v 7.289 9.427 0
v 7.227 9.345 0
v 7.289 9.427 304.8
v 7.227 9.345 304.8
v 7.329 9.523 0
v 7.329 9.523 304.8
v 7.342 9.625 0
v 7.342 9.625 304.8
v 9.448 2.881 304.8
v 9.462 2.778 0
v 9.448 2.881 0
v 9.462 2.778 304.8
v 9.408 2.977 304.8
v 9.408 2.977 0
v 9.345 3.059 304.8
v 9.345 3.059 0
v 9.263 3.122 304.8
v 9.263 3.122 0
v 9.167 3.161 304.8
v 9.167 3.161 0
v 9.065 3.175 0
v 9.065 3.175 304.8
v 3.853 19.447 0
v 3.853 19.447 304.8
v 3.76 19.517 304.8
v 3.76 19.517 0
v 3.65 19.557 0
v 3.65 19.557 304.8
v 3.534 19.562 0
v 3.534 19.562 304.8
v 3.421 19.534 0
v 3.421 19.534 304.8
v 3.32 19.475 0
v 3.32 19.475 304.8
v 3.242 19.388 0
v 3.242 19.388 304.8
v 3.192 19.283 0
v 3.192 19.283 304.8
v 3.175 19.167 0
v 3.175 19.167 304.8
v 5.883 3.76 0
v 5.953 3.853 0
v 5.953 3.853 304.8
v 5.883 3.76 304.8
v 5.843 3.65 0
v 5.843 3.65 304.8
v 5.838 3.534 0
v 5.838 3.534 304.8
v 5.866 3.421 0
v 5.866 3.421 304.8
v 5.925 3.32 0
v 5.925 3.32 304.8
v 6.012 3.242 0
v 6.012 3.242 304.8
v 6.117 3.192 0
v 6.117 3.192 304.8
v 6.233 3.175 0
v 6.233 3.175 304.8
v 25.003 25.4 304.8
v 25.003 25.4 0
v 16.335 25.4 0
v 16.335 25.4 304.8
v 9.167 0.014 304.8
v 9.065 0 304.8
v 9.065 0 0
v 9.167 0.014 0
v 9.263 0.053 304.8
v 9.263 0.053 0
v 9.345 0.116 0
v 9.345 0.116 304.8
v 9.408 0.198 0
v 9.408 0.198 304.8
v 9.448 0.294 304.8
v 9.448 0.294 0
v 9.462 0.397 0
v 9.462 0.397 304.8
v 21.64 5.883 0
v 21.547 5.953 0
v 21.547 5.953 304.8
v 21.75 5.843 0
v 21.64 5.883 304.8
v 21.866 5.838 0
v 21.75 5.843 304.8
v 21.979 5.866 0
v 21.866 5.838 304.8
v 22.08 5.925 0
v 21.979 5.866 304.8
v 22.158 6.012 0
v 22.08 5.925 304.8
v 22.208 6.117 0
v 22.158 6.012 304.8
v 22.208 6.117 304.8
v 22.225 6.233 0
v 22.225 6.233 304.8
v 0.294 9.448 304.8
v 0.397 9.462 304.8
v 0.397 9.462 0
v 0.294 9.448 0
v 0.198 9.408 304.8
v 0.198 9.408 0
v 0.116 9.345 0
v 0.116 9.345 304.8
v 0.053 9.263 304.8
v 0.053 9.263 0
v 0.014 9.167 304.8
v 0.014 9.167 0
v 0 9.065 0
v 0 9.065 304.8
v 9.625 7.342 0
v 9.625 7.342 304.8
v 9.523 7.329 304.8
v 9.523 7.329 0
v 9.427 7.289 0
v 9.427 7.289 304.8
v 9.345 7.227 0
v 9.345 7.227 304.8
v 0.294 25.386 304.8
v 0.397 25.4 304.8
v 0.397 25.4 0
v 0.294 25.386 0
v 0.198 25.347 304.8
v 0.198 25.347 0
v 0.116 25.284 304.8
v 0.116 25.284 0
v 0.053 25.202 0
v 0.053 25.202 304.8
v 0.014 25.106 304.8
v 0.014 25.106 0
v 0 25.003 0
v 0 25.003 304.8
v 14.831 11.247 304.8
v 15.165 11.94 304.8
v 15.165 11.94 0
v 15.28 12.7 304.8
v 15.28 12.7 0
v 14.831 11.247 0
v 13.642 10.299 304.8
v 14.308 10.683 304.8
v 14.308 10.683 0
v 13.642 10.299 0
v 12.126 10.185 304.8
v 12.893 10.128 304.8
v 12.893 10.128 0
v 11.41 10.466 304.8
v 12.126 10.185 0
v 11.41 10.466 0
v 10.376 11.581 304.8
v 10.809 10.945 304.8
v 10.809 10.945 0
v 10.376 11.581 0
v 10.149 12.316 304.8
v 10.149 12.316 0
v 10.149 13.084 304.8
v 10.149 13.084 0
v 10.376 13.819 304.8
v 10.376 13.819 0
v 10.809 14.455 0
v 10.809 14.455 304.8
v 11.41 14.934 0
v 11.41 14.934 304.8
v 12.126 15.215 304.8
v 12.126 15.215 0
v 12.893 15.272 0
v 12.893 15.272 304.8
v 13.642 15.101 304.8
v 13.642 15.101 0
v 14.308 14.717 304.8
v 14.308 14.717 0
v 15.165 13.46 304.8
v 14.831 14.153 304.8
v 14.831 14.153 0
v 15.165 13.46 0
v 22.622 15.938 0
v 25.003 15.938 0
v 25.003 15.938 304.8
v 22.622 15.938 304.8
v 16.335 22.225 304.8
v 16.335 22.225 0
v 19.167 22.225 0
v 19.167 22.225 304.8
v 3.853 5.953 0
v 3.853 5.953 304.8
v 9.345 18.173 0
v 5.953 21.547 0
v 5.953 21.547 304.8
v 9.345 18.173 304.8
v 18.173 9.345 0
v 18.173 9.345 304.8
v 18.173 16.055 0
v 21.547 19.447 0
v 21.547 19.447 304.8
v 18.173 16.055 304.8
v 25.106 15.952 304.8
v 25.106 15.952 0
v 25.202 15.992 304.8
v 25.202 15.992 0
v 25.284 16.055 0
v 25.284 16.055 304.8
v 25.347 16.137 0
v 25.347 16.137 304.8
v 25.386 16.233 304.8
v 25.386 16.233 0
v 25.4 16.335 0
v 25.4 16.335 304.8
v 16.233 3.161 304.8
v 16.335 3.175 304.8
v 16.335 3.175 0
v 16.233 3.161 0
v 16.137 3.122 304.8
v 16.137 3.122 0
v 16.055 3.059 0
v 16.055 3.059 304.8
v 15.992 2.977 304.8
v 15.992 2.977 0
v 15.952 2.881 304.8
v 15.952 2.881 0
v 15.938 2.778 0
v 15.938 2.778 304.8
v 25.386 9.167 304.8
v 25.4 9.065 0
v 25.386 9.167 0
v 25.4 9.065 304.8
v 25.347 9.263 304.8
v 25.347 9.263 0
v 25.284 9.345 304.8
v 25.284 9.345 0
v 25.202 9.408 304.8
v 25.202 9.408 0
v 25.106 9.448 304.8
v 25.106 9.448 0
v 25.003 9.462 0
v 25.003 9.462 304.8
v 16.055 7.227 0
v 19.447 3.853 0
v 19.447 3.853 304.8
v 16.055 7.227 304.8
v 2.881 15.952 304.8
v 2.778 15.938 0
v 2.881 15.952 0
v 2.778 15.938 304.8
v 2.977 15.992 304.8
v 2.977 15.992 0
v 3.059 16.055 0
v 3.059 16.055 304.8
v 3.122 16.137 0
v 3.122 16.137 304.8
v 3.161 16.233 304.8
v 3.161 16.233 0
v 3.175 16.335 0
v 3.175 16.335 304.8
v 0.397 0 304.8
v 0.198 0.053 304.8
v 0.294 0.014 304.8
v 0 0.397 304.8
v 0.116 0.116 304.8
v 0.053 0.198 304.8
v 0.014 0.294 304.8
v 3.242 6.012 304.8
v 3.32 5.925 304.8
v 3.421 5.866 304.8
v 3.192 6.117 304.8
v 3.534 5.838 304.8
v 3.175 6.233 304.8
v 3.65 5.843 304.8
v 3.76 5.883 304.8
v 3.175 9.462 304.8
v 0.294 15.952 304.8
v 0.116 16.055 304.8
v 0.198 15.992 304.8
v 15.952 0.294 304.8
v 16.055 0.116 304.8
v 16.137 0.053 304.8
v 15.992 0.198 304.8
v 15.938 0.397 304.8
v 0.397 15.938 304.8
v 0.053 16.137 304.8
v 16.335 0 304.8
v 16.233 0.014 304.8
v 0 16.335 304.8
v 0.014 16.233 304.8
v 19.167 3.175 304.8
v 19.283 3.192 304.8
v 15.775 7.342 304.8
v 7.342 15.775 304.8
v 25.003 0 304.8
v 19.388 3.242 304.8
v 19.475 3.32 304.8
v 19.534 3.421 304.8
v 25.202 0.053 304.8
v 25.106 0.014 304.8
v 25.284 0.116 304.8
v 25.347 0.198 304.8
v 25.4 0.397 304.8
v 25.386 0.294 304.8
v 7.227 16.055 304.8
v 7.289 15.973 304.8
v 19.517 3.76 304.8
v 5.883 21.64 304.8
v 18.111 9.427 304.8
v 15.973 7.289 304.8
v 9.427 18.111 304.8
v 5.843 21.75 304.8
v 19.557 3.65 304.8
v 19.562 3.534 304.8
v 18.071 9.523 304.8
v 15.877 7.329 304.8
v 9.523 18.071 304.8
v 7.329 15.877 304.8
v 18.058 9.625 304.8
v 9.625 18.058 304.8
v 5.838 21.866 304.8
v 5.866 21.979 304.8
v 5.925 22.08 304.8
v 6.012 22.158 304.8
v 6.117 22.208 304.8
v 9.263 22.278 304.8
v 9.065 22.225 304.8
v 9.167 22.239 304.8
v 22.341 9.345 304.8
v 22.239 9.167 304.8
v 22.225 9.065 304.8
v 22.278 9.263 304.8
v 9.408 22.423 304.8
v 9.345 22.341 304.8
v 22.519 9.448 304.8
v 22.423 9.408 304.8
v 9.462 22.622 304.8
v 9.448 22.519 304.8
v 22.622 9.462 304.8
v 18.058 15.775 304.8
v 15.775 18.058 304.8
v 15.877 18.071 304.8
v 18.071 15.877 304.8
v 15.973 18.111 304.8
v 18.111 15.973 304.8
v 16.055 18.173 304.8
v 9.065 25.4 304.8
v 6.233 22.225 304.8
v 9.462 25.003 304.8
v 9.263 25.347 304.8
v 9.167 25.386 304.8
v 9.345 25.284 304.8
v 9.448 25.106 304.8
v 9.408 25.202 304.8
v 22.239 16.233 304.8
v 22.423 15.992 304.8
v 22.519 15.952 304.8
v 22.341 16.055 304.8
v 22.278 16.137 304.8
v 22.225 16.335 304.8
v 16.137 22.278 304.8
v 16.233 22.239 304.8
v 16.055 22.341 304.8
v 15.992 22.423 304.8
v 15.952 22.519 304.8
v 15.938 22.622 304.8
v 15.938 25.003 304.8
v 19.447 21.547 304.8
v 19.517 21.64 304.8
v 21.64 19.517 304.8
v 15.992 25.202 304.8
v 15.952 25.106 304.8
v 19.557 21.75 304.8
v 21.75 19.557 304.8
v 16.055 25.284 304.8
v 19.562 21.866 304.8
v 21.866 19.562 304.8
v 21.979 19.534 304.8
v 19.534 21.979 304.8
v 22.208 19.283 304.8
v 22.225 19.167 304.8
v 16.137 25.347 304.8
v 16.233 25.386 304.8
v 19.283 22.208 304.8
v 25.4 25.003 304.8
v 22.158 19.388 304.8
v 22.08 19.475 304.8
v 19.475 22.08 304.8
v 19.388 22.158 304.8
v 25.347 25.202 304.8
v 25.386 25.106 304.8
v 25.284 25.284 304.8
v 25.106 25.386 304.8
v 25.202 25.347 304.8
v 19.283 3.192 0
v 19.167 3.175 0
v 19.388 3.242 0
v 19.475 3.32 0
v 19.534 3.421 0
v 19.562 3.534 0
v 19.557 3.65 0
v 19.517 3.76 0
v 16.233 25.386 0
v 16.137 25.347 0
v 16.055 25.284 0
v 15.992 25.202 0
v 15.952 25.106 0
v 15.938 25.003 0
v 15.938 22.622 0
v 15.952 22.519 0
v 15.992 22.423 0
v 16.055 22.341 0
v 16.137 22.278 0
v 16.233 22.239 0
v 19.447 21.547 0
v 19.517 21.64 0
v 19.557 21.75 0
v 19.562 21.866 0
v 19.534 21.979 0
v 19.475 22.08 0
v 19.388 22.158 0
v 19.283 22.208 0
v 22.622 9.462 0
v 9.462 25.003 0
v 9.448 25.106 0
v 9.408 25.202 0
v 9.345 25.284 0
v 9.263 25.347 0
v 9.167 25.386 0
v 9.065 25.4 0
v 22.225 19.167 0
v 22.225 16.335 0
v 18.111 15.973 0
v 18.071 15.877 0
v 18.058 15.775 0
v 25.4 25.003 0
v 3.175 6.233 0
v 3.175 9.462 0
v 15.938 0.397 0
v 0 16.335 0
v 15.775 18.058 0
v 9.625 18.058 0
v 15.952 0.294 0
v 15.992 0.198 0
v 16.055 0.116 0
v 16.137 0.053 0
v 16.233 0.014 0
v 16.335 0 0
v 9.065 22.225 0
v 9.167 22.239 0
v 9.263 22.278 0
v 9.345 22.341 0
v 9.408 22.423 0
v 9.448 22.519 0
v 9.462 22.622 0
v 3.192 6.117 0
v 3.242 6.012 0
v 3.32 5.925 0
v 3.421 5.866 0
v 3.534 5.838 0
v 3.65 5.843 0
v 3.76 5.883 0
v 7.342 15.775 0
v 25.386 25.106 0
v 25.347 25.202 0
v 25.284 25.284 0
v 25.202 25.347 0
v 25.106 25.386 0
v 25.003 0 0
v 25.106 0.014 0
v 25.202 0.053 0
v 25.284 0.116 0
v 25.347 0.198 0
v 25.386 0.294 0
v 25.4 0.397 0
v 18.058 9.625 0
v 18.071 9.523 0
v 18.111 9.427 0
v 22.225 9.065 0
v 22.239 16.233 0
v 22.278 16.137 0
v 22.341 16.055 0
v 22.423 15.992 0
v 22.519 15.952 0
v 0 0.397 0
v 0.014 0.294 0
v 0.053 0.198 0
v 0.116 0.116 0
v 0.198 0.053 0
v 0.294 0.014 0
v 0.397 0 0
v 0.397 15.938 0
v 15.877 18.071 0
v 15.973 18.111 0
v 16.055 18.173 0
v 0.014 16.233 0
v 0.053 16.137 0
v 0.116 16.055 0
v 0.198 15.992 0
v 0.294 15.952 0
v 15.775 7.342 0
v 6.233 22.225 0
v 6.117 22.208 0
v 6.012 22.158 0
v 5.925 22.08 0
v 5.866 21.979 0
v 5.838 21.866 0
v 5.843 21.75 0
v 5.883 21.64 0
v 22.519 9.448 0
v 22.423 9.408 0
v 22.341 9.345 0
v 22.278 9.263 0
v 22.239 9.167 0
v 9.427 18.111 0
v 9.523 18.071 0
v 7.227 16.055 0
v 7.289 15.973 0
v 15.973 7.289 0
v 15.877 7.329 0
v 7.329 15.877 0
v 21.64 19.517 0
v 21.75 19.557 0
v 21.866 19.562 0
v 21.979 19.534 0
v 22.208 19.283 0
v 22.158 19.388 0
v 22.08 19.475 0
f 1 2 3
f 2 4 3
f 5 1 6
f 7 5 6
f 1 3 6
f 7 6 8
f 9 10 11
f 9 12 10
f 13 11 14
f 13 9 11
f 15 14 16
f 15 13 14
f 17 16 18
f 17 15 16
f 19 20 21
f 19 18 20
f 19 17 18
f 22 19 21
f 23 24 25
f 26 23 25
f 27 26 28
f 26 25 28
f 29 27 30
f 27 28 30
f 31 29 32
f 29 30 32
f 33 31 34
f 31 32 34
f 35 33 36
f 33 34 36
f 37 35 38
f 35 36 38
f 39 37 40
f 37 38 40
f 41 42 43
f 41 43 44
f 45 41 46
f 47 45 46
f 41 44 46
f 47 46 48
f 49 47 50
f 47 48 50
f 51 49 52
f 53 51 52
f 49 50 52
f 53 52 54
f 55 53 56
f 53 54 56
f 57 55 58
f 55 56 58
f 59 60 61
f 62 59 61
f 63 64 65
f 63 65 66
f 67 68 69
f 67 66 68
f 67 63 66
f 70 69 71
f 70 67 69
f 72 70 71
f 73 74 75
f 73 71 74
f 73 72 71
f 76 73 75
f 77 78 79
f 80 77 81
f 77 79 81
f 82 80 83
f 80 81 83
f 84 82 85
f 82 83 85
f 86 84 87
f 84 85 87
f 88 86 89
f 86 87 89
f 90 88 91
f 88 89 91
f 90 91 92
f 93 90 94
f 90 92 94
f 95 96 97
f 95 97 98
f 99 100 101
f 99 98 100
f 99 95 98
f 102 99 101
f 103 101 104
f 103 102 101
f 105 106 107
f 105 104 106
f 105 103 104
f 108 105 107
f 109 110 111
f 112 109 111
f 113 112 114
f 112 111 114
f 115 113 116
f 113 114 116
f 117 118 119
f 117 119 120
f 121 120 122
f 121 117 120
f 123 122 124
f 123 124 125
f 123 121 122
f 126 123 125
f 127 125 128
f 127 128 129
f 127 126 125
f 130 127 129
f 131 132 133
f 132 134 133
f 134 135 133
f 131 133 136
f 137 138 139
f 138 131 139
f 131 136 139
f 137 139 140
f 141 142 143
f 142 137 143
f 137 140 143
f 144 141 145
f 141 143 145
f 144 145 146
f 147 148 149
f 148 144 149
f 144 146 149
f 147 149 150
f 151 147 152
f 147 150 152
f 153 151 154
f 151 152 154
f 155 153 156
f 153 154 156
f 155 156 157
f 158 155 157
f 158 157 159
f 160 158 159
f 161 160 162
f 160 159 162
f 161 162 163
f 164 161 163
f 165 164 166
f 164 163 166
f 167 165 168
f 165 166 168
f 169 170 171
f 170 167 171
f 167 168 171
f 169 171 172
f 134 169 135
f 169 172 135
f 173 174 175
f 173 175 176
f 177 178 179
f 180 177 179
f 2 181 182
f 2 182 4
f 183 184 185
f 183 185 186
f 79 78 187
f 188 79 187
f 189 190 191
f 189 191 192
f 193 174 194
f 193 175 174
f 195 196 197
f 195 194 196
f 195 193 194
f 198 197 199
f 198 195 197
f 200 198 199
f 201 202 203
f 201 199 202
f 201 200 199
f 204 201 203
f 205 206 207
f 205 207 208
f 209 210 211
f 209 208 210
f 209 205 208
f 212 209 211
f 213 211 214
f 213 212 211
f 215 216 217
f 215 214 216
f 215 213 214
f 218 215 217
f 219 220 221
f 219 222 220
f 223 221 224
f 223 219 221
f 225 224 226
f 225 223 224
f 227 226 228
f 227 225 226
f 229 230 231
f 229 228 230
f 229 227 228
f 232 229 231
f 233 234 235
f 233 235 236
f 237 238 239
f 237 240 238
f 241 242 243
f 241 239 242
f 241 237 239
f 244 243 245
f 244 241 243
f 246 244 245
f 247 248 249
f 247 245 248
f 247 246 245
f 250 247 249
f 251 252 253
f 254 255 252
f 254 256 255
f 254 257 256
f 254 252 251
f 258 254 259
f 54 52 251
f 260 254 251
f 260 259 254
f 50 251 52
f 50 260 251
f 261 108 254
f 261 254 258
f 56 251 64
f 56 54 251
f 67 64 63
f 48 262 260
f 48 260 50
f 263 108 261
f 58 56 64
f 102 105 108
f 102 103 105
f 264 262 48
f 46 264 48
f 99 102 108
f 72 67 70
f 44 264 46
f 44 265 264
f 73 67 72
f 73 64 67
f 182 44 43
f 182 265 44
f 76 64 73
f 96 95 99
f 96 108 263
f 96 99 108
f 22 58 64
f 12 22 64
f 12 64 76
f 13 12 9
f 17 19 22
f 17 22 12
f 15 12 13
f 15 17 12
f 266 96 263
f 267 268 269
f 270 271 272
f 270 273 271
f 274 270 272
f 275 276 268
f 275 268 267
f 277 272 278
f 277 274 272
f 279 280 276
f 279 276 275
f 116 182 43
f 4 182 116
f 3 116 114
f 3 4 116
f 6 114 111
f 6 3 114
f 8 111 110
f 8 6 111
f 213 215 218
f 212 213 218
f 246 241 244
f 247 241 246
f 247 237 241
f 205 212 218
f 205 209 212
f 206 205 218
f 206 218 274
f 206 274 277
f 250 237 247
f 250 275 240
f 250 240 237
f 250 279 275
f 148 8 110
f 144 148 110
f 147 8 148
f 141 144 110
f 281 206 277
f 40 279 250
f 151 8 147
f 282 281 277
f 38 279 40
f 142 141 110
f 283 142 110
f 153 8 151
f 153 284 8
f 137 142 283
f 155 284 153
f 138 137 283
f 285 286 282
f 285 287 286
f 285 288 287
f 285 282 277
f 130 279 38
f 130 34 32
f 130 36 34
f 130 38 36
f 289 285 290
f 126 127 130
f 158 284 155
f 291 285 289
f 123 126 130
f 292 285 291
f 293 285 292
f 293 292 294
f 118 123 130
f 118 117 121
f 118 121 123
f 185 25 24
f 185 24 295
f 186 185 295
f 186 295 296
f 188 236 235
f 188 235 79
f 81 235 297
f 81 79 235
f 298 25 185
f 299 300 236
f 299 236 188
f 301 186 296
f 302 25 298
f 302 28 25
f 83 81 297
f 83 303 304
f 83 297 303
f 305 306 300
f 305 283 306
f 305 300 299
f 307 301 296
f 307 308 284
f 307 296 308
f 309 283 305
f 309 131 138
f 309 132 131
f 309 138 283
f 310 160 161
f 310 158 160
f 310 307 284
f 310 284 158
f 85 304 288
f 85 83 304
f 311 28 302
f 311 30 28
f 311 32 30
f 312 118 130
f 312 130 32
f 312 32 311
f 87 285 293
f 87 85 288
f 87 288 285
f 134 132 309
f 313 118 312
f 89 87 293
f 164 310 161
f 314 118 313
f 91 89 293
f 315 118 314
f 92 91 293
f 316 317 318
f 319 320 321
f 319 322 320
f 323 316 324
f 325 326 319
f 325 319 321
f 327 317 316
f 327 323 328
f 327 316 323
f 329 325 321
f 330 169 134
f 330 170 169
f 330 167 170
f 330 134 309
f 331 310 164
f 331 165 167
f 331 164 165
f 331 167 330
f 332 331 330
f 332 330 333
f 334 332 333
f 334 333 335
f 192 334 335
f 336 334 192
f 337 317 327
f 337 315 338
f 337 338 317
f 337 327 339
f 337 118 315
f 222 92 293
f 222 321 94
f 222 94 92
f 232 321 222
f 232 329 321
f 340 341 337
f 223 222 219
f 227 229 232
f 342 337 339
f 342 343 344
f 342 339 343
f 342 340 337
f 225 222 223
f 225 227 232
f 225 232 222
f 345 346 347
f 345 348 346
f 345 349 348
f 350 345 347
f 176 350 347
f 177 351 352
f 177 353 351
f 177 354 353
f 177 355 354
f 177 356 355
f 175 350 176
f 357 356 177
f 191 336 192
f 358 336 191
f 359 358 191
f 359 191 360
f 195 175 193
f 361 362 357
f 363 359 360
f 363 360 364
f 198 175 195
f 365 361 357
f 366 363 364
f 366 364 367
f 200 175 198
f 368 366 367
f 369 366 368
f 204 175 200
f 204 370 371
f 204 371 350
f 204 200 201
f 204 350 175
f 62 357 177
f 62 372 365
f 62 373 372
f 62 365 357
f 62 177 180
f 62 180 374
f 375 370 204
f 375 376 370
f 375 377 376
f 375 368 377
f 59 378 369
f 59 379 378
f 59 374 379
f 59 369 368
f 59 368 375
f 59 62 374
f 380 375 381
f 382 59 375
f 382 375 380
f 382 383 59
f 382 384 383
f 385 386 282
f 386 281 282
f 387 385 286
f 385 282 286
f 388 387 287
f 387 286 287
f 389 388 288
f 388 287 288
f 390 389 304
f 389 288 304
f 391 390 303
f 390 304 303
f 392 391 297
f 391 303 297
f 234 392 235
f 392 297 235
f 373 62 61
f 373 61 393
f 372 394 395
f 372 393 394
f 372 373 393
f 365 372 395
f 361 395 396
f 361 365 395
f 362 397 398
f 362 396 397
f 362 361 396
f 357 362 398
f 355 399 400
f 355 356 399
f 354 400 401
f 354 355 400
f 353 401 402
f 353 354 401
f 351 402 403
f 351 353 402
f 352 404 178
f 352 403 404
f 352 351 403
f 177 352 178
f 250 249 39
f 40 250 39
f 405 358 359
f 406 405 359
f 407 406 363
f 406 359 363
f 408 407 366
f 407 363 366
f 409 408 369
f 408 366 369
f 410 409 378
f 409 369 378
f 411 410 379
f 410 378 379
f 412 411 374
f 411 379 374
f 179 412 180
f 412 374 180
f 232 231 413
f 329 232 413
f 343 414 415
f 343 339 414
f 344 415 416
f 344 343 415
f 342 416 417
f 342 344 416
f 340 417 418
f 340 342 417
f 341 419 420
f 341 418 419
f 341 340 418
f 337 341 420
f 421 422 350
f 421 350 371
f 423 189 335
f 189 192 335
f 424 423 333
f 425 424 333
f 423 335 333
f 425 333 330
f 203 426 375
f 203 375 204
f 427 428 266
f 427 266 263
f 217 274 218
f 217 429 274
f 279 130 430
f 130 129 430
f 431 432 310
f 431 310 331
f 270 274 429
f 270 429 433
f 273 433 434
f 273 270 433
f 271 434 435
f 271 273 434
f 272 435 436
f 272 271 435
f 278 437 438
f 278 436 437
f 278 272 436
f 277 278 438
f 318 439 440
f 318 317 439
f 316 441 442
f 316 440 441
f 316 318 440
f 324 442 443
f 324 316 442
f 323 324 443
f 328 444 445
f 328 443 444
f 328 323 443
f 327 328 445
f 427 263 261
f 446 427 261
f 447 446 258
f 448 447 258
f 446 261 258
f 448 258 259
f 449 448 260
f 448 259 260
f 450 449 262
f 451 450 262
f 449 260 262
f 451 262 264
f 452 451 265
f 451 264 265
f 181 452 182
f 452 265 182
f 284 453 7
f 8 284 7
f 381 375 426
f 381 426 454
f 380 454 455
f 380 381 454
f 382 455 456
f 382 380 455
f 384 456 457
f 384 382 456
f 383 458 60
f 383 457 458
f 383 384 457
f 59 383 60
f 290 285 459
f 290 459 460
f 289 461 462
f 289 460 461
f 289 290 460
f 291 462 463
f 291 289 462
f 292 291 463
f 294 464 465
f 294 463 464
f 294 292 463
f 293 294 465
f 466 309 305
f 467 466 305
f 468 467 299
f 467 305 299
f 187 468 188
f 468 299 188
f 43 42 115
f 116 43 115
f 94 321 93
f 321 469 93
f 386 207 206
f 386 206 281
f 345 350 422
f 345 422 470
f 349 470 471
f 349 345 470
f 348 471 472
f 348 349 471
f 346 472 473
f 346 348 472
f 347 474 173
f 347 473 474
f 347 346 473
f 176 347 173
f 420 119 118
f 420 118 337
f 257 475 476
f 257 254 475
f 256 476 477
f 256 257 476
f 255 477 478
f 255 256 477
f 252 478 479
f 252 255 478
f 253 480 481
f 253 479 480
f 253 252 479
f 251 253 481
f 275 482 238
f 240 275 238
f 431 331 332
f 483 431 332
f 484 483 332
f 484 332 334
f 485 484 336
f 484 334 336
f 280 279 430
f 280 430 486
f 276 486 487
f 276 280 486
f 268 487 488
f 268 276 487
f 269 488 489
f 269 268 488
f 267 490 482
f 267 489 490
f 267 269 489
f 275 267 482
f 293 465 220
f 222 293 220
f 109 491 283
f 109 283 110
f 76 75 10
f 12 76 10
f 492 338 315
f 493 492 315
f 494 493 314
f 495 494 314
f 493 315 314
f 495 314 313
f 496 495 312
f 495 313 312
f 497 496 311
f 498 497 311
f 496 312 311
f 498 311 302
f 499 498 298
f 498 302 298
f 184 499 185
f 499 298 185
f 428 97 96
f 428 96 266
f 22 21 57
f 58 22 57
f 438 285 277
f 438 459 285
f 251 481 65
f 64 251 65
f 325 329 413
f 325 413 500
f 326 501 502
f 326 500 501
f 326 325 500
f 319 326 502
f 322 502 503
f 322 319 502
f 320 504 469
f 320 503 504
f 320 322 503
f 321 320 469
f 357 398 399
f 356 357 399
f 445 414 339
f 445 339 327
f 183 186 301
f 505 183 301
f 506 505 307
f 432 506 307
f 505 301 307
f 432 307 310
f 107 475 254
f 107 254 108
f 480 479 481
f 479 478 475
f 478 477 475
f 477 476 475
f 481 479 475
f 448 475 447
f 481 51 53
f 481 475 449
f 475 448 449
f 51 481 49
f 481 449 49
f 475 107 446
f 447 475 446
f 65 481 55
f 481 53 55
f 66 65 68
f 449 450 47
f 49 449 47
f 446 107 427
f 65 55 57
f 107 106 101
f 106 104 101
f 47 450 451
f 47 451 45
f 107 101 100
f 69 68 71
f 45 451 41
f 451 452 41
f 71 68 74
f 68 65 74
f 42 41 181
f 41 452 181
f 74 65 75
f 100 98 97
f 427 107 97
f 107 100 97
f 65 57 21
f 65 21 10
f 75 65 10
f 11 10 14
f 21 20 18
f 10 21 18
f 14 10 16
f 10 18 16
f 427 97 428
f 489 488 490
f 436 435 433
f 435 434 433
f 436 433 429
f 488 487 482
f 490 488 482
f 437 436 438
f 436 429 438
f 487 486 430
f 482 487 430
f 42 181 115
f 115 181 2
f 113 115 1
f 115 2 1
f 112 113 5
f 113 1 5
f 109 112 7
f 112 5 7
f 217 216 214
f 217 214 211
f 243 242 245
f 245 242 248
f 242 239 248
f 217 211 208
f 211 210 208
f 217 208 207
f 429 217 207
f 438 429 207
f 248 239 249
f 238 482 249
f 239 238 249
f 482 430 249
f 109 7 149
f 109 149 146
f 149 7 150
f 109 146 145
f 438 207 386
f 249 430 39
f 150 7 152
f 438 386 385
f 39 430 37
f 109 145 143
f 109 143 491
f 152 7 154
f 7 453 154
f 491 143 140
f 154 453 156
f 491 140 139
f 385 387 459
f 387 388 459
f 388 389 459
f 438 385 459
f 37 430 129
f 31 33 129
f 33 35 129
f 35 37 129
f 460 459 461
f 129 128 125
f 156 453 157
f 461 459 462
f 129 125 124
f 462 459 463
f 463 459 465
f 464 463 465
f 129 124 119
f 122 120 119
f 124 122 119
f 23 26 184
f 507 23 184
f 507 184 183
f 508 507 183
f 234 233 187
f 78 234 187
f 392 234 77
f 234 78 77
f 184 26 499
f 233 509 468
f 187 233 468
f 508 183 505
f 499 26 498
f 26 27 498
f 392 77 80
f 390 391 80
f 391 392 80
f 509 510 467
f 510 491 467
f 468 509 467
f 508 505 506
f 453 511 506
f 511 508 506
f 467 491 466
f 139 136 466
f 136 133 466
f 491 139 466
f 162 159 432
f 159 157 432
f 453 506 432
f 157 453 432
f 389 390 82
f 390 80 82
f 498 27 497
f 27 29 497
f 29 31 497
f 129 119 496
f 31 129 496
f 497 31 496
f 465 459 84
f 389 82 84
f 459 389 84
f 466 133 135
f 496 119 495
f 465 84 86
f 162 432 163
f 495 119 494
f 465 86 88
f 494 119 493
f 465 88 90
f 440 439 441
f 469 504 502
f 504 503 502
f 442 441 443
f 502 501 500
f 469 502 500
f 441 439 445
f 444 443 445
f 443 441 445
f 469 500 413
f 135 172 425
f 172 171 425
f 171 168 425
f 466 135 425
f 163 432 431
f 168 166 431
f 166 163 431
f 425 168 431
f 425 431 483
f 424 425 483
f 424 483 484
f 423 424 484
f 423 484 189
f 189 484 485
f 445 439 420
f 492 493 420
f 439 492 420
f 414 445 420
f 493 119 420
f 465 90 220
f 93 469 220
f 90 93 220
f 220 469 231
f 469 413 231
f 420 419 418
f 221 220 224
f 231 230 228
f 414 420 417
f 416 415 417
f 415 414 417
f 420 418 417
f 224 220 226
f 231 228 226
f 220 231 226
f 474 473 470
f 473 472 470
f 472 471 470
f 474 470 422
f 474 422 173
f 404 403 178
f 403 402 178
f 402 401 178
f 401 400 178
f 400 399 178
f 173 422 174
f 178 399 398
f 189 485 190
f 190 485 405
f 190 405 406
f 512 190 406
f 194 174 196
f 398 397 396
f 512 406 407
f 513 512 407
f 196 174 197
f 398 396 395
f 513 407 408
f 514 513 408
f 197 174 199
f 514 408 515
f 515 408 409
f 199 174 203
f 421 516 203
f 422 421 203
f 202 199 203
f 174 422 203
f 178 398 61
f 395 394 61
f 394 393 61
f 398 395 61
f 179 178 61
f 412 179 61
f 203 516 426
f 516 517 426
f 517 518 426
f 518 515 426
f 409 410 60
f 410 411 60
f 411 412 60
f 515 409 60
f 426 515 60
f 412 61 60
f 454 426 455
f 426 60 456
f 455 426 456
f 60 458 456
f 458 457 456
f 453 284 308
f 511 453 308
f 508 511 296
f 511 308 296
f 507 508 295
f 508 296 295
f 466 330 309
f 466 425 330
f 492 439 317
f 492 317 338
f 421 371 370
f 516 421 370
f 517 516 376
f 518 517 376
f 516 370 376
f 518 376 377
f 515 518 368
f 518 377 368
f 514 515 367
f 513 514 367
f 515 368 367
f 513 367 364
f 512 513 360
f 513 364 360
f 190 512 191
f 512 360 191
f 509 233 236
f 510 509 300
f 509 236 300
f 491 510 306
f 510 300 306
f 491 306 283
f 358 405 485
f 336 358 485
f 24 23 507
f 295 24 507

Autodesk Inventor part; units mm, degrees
ref_plane "YZ Plane" through (0, 0, 0) normal (1, 0, 0) x (0, 1, 0)
ref_plane "XZ Plane" through (0, 0, 0) normal (0, 1, 0) x (-1, 0, 0)
ref_plane "XY Plane" through (0, 0, 0) normal (0, 0, 1) x (1, 0, 0)
sketch "Sketch1" plane through (0, 0, 0) normal (0, 0, 1) x (1, 0, 0)
  line L0 (0, 0) -> (25.4, 0) construction
  line L1 (25.4, 0) -> (25.4, 25.4) construction
  line L2 (25.4, 25.4) -> (0, 25.4) construction
  line L3 (0, 25.4) -> (0, 0) construction
  line L4 (0, 25.4) -> (9.4615, 25.4) construction
  line L5 (9.4615, 25.4) -> (9.4615, 15.9385) construction
  line L6 (9.4615, 15.9385) -> (0, 15.9385) construction
  line L7 (0, 15.9385) -> (0, 25.4) construction
  line L8 (25.4, 25.4) -> (15.9385, 25.4) construction
  line L9 (15.9385, 25.4) -> (15.9385, 15.9385) construction
  line L10 (15.9385, 15.9385) -> (25.4, 15.9385) construction
  line L11 (25.4, 15.9385) -> (25.4, 25.4) construction
  line L12 (25.4, 0) -> (15.9385, 0) construction
  line L13 (15.9385, 0) -> (15.9385, 9.4615) construction
  line L14 (15.9385, 9.4615) -> (25.4, 9.4615) construction
  line L15 (25.4, 9.4615) -> (25.4, 0) construction
  line L16 (0, 0) -> (9.4615, 0) construction
  line L17 (9.4615, 0) -> (9.4615, 9.4615) construction
  line L18 (9.4615, 9.4615) -> (0, 9.4615) construction
  line L19 (0, 9.4615) -> (0, 0) construction
  circle A0 centre (12.7, 12.7) radius 2.5797
  line L20 (0, 25.4) -> (9.4615, 25.4)
  line L21 (9.4615, 25.4) -> (9.4615, 22.225)
  line L22 (0, 25.4) -> (0, 15.9385)
  line L23 (0, 15.9385) -> (3.175, 15.9385)
  line L24 (0, 0) -> (0, 9.4615)
  line L25 (0, 9.4615) -> (3.175, 9.4615)
  line L26 (0, 0) -> (9.4615, 0)
  line L27 (9.4615, 0) -> (9.4615, 3.175)
  line L28 (25.4, 0) -> (15.9385, 0)
  line L29 (25.4, 0) -> (25.4, 9.4615)
  line L30 (25.4, 9.4615) -> (22.225, 9.4615)
  line L31 (15.9385, 0) -> (15.9385, 3.175)
  line L32 (25.4, 25.4) -> (25.4, 15.9385)
  line L33 (25.4, 25.4) -> (15.9385, 25.4)
  line L34 (15.9385, 25.4) -> (15.9385, 22.225)
  line L35 (25.4, 15.9385) -> (22.225, 15.9385)
  line L36 (9.4615, 22.225) -> (5.2705, 22.225)
  line L37 (3.175, 15.9385) -> (3.175, 20.1295)
  line L38 (3.175, 9.4615) -> (3.175, 5.2705)
  line L39 (9.4615, 3.175) -> (5.2705, 3.175)
  line L40 (15.9385, 3.175) -> (20.1295, 3.175)
  line L41 (22.225, 9.4615) -> (22.225, 5.2705)
  line L42 (15.9385, 22.225) -> (20.1295, 22.225)
  line L43 (22.225, 15.9385) -> (22.225, 20.1295)
  line L44 (7.3422, 7.3422) -> (18.0578, 7.3422) construction
  line L45 (18.0578, 7.3422) -> (18.0578, 18.0578) construction
  line L46 (18.0578, 18.0578) -> (7.3422, 18.0578) construction
  line L47 (7.3422, 18.0578) -> (7.3422, 7.3422) construction
  line L48 (7.3422, 7.3422) -> (18.0578, 18.0578) construction
  line L49 (18.0578, 7.3422) -> (7.3422, 18.0578) construction
  line L50 (5.2705, 22.225) -> (9.4615, 18.0578)
  line L51 (3.175, 20.1295) -> (7.3422, 15.9385)
  line L52 (20.1295, 22.225) -> (15.9385, 18.0578)
  line L53 (22.225, 20.1295) -> (18.0578, 15.9385)
  line L54 (22.225, 5.2705) -> (18.0578, 9.4615)
  line L55 (20.1295, 3.175) -> (15.9385, 7.3422)
  line L56 (5.2705, 3.175) -> (9.4615, 7.3422)
  line L57 (3.175, 5.2705) -> (7.3422, 9.4615)
  line L58 (7.3422, 15.9385) -> (7.3422, 9.4615)
  line L59 (9.4615, 18.0578) -> (15.9385, 18.0578)
  line L60 (18.0578, 15.9385) -> (18.0578, 9.4615)
  line L61 (15.9385, 7.3422) -> (9.4615, 7.3422)
  dimension "d0" = 25.4
  dimension "d1" = 25.4
  dimension "d2" = 9.4615
  dimension "d3" = 9.4615
  dimension "d4" = 9.4615
  dimension "d5" = 9.4615
  dimension "d6" = 9.4615
  dimension "d7" = 9.4615
  dimension "d8" = 9.4615
  dimension "d9" = 9.4615
  dimension "d10" = 12.7
  dimension "d11" = 12.7
  dimension "d12" = 5.1594
  dimension "d13" = 3.175
  dimension "d14" = 3.175
  dimension "d15" = 3.175
  dimension "d16" = 3.175
  dimension "d17" = 3.175
  dimension "d18" = 3.175
  dimension "d19" = 3.175
  dimension "d20" = 3.175
  dimension "d21" = 4.191
  dimension "d22" = 4.191
  dimension "d23" = 4.191
  dimension "d24" = 4.191
  dimension "d25" = 4.191
  dimension "d26" = 4.191
  dimension "d27" = 4.191
  dimension "d28" = 4.191
  dimension "d29" = 10.7156
  dimension "d30" = 10.7156
extrude "Extrusion1" add sketch "Sketch1" along normal blind 304.8
fillet "Fillet1" radius 0.3969 35 edges at (9.4615, 25.4, 152.4) (9.4615, 22.225, 152.4) (5.2705, 22.225, 152.4) (9.4615, 18.0578, 152.4) (15.9385, 18.0578, 152.4) (20.1295, 22.225, 152.4) (15.9385, 22.225, 152.4) (15.9385, 25.4, 152.4) (25.4, 25.4, 152.4) (25.4, 15.9385, 152.4) (22.225, 15.9385, 152.4) (22.225, 20.1295, 152.4) (18.0578, 15.9385, 152.4) (18.0578, 9.4615, 152.4) (22.225, 5.2705, 152.4) (22.225, 9.4615, 152.4) (25.4, 9.4615, 152.4) (25.4, 0, 152.4) (15.9385, 0, 152.4) (15.9385, 3.175, 152.4) (20.1295, 3.175, 152.4) (15.9385, 7.3422, 152.4) (9.4615, 7.3422, 152.4) (5.2705, 3.175, 152.4) (9.4615, 3.175, 152.4) (9.4615, 0, 152.4) (0, 0, 152.4) (0, 9.4615, 152.4) (3.175, 5.2705, 152.4) (7.3422, 9.4615, 152.4) (7.3422, 15.9385, 152.4) (3.175, 20.1295, 152.4) (3.175, 15.9385, 152.4) (0, 15.9385, 152.4) (0, 25.4, 152.4)
properties part number "80-20 1x1"
